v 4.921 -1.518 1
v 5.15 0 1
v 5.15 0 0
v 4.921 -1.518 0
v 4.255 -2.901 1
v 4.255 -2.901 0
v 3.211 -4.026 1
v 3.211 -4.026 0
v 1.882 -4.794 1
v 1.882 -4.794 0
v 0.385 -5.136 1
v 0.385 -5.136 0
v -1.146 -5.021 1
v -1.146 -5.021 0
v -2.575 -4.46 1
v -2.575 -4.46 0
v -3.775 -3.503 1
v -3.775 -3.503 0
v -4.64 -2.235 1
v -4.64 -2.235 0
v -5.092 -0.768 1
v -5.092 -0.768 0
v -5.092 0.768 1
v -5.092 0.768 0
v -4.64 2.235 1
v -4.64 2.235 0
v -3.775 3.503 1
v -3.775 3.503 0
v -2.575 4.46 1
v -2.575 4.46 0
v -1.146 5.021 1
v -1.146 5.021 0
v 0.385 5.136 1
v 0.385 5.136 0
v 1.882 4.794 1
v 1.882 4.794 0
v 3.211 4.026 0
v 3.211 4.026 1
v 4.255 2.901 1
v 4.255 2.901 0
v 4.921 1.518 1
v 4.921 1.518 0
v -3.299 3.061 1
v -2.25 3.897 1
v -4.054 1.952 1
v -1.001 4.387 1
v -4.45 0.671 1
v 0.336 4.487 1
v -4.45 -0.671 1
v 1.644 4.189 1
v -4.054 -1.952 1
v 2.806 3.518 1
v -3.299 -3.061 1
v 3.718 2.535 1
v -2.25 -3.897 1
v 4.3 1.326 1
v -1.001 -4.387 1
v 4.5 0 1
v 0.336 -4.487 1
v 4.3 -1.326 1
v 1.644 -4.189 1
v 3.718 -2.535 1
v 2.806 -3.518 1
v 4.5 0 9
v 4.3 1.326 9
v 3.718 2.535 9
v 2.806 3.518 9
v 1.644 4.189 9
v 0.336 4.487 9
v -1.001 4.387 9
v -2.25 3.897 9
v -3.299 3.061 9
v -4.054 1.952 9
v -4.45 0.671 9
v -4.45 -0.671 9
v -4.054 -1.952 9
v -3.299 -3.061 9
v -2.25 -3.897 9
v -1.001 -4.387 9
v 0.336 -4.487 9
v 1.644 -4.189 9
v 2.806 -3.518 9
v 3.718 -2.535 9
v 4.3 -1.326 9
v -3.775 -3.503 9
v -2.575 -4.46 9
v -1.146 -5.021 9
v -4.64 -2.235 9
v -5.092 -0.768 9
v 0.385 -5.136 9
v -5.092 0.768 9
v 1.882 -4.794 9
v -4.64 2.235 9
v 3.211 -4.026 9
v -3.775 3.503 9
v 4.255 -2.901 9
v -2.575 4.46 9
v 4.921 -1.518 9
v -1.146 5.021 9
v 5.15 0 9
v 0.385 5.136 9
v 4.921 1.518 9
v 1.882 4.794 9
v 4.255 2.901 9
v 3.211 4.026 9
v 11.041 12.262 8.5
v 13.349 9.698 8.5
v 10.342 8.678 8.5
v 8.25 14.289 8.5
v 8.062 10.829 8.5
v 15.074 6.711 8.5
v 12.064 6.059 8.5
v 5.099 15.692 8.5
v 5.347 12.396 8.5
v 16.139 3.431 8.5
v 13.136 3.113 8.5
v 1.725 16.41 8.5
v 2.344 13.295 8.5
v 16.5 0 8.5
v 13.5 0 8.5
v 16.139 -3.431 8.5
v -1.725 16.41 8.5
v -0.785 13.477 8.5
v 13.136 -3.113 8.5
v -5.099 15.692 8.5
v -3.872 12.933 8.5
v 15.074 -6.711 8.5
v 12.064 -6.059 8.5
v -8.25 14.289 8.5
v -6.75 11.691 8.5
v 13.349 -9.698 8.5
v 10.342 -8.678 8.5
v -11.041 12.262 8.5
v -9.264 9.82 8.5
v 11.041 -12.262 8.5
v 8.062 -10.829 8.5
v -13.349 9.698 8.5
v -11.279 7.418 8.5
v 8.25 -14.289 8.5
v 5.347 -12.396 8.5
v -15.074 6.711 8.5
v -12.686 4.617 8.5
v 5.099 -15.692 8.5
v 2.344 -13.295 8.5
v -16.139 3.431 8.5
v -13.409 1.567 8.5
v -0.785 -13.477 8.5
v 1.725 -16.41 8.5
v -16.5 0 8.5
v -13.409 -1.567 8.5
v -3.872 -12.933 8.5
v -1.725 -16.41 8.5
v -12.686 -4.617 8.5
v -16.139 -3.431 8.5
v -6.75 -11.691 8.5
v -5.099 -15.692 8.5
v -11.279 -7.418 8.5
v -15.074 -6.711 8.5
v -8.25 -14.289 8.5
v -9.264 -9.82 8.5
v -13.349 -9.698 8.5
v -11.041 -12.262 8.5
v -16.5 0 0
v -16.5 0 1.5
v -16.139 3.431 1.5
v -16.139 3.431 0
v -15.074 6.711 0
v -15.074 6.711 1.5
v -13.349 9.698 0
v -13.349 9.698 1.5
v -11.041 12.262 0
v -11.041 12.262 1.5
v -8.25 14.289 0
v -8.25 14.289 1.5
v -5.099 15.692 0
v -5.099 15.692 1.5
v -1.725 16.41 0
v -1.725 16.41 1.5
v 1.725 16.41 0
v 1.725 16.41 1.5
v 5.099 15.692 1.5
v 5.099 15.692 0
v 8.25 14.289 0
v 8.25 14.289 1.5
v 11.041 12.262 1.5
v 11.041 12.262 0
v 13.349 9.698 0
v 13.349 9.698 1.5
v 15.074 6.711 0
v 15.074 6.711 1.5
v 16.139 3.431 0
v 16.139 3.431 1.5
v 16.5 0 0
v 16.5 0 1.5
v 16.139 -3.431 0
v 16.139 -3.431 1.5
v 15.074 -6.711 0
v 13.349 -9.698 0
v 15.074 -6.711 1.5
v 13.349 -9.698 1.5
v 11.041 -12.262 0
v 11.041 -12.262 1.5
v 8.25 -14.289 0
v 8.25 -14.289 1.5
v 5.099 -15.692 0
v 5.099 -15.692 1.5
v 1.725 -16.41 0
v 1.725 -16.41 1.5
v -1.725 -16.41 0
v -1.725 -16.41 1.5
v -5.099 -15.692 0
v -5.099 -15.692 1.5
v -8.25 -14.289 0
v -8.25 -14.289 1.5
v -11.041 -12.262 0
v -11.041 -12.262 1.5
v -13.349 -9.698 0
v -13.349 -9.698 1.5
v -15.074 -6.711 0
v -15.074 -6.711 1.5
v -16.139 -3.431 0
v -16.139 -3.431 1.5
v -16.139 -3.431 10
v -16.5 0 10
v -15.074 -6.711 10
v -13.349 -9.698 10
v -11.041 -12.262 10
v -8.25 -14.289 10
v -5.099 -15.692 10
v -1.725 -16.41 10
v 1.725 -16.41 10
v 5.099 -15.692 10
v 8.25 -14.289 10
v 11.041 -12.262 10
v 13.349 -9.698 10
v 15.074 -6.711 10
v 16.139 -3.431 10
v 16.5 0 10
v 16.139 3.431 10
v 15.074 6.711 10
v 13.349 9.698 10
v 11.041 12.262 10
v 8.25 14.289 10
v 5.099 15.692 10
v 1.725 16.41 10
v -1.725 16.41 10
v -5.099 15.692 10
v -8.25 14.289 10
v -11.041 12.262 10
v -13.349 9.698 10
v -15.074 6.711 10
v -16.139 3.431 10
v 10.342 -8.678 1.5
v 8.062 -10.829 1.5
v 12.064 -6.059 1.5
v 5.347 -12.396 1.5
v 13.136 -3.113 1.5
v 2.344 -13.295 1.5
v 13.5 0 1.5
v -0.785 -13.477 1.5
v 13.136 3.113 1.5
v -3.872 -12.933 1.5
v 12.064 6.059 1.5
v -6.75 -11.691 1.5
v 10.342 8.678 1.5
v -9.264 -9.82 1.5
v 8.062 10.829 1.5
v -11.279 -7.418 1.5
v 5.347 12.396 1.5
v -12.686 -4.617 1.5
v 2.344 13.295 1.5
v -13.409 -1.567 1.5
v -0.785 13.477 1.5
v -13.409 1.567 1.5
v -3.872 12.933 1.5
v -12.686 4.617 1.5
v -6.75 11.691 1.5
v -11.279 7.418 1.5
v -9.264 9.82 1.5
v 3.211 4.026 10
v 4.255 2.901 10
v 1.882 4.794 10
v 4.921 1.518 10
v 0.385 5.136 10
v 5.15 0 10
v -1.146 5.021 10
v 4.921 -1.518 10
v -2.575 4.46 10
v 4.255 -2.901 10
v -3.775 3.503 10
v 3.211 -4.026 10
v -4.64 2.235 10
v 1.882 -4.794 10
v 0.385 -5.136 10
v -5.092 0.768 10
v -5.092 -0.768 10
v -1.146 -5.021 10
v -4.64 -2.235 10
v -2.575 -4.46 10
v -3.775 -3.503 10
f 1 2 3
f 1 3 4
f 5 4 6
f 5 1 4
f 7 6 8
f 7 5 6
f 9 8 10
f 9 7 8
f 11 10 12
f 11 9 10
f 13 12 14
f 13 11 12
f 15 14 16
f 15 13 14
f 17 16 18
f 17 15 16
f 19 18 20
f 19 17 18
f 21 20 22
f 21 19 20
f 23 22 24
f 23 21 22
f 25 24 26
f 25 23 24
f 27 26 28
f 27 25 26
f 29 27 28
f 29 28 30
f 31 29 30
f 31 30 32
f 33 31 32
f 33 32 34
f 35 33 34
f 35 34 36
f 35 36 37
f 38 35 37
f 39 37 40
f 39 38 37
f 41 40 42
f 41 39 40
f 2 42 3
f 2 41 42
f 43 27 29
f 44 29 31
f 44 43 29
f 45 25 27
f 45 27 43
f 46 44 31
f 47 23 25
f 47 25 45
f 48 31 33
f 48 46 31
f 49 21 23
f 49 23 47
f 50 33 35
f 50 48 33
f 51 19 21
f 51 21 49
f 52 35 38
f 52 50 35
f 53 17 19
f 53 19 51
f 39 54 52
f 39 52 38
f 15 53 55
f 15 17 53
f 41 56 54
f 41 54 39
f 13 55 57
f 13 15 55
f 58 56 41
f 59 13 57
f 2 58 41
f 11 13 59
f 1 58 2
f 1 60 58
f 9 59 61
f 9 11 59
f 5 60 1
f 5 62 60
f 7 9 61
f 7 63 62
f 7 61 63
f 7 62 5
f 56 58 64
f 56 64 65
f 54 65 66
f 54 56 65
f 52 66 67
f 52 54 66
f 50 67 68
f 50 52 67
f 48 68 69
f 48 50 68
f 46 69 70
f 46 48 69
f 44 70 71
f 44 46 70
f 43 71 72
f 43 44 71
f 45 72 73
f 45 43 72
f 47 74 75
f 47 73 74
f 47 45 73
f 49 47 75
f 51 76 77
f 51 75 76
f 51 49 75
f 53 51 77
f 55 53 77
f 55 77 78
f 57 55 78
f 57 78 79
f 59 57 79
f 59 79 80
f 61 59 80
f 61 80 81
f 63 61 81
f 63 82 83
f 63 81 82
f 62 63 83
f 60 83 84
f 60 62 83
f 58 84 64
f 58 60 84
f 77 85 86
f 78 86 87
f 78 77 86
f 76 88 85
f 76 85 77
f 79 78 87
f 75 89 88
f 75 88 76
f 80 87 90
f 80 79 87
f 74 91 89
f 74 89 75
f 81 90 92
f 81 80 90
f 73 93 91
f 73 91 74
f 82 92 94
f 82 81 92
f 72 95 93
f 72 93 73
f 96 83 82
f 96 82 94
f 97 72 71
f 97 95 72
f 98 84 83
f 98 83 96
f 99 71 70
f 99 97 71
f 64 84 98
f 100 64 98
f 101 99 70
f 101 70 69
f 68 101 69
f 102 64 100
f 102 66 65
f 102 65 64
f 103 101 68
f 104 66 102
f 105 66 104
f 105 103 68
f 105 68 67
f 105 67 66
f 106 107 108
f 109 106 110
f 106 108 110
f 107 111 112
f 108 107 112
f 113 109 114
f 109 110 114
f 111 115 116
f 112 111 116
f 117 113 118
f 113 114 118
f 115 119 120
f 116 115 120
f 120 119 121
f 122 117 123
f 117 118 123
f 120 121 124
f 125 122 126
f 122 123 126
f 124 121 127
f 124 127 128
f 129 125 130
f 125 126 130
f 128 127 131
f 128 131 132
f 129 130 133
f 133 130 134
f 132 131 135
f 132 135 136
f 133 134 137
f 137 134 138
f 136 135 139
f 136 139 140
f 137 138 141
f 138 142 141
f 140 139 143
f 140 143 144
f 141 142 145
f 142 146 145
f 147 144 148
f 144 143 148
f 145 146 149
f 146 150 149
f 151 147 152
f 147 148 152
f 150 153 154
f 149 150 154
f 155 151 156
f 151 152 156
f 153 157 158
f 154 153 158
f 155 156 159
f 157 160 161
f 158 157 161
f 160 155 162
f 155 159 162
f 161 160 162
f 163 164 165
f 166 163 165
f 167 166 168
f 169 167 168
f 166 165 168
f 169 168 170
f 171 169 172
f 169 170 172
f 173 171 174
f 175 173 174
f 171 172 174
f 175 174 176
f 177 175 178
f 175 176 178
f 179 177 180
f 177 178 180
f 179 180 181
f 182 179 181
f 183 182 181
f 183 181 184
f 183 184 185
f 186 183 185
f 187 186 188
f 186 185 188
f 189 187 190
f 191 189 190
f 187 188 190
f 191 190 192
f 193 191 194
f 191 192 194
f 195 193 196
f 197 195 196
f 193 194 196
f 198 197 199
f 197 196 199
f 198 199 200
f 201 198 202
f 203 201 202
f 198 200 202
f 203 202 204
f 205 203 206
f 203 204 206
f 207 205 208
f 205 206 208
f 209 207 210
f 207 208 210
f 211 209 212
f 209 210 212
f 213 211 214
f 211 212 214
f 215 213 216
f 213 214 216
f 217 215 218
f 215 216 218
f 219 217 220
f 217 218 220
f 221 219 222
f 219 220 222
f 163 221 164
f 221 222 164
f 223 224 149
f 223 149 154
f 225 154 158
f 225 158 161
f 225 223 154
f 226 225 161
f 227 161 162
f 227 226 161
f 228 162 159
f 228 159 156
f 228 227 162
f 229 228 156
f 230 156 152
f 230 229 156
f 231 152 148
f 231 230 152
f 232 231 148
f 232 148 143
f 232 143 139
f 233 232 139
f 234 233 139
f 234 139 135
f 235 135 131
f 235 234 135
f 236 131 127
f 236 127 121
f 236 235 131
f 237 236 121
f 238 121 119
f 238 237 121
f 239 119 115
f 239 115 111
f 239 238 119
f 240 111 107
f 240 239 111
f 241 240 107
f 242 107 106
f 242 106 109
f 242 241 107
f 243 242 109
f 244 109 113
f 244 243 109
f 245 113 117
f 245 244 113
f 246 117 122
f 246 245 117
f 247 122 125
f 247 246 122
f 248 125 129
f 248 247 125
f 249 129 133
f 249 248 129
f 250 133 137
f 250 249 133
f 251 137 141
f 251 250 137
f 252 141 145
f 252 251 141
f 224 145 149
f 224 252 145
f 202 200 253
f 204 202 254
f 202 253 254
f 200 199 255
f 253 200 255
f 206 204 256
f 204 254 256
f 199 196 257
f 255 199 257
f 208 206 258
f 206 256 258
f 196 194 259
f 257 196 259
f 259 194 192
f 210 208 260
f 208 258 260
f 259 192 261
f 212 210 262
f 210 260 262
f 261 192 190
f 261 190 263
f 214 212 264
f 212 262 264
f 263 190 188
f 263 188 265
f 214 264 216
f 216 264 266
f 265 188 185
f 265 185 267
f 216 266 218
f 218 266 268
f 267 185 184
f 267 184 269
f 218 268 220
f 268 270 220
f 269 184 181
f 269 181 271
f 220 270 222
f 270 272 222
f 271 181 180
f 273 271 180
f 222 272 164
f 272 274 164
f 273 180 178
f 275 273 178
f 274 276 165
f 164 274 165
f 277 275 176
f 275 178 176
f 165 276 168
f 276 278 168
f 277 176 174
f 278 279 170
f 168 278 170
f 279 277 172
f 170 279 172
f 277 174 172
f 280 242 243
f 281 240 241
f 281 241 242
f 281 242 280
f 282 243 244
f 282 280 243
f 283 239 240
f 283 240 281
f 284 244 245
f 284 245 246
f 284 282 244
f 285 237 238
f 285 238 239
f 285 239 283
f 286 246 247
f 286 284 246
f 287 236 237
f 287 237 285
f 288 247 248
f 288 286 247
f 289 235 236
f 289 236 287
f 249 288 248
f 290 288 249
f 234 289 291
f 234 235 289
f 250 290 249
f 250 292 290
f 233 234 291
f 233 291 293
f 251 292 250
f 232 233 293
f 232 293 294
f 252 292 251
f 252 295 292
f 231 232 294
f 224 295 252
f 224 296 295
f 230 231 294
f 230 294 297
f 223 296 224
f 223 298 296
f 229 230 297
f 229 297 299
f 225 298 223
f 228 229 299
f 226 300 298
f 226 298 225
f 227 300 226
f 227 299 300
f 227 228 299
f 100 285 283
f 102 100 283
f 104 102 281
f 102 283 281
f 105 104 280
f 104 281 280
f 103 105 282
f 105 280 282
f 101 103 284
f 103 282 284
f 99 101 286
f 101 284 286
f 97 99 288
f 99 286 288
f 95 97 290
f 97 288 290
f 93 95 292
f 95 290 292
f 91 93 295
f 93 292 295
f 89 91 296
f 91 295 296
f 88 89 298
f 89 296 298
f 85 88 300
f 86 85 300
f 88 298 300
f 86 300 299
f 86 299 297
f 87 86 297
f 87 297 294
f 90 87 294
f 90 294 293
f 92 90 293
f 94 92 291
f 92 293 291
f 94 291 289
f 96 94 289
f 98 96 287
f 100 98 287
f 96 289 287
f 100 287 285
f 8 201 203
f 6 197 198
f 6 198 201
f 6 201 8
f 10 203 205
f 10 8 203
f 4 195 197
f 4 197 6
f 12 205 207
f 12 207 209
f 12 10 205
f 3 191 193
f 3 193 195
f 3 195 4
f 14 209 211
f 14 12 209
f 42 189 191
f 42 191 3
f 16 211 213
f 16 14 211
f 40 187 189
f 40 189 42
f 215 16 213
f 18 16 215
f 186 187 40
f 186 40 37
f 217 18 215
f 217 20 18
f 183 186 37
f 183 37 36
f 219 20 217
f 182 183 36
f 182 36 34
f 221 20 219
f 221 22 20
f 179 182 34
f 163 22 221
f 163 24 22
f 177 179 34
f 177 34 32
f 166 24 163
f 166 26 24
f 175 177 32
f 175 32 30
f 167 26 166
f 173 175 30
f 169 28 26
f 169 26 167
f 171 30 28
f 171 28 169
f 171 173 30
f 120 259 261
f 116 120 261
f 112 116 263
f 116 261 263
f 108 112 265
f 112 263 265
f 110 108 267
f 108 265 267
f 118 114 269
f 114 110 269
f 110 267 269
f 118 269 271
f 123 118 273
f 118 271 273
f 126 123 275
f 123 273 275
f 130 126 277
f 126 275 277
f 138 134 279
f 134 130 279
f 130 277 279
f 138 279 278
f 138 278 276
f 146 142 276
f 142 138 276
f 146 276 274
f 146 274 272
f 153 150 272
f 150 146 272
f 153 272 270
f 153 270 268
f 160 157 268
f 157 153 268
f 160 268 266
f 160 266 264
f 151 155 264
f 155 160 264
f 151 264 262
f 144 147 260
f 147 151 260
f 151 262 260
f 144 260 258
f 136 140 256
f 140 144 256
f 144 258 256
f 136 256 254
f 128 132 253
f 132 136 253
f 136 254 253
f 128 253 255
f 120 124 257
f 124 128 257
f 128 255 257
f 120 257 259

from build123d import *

# Parameters (mm, degrees)
SKETCH1_R           = 13.5
SKETCH1_R_2         = 4.5
BOSS_EXTRUDE1_DEPTH = 10
SKETCH2_R           = 5.15
CUT_EXTRUDE1_DEPTH  = 1
CUT_EXTRUDE2_START  = -1
SKETCH3_R           = 5.15
CUT_EXTRUDE2_DEPTH  = 1
BOSS_EXTRUDE2_START = -1.5
SKETCH4_R           = 16.5
SKETCH4_R_2         = 5.15
BOSS_EXTRUDE2_DEPTH = 1.5
SKETCH5_R           = 16.5
SKETCH5_R_2         = 5.15
BOSS_EXTRUDE3_DEPTH = 1.5


with BuildPart() as part:
    # Sketch1 → Boss-Extrude1 (new body)
    with BuildSketch(Plane.XY):
        Circle(SKETCH1_R)
        Circle(SKETCH1_R_2, mode=Mode.SUBTRACT)
    extrude(amount=BOSS_EXTRUDE1_DEPTH)

    # Sketch2 → Cut-Extrude1 (cut)
    with BuildSketch(Plane.XY.offset(10)):
        Circle(SKETCH2_R)
    extrude(amount=-CUT_EXTRUDE1_DEPTH, mode=Mode.SUBTRACT)

    # Sketch3 → Cut-Extrude2 (cut)
    with BuildSketch(Plane(origin=(0, 0, 0), x_dir=(-1, 0, 0), z_dir=(0, 0, -1)).offset(CUT_EXTRUDE2_START)):
        with Locations(Location((0, 0, 0), (0, 0, 180))):
            Circle(SKETCH3_R)
    extrude(amount=CUT_EXTRUDE2_DEPTH, mode=Mode.SUBTRACT)

    # Sketch4 → Boss-Extrude2 (add)
    with BuildSketch(Plane(origin=(0, 0, 0), x_dir=(-1, 0, 0), z_dir=(0, 0, -1)).offset(BOSS_EXTRUDE2_START)):
        Circle(SKETCH4_R)
        with Locations(Location((0, 0, 0), (0, 0, 180))):
            Circle(SKETCH4_R_2, mode=Mode.SUBTRACT)
    extrude(amount=BOSS_EXTRUDE2_DEPTH)

    # Sketch5 → Boss-Extrude3 (add)
    with BuildSketch(Plane.XY.offset(10)):
        with Locations(Location((0, 0, 0), (0, 0, 180))):
            Circle(SKETCH5_R)
        Circle(SKETCH5_R_2, mode=Mode.SUBTRACT)
    extrude(amount=-BOSS_EXTRUDE3_DEPTH)


solid = part.part
